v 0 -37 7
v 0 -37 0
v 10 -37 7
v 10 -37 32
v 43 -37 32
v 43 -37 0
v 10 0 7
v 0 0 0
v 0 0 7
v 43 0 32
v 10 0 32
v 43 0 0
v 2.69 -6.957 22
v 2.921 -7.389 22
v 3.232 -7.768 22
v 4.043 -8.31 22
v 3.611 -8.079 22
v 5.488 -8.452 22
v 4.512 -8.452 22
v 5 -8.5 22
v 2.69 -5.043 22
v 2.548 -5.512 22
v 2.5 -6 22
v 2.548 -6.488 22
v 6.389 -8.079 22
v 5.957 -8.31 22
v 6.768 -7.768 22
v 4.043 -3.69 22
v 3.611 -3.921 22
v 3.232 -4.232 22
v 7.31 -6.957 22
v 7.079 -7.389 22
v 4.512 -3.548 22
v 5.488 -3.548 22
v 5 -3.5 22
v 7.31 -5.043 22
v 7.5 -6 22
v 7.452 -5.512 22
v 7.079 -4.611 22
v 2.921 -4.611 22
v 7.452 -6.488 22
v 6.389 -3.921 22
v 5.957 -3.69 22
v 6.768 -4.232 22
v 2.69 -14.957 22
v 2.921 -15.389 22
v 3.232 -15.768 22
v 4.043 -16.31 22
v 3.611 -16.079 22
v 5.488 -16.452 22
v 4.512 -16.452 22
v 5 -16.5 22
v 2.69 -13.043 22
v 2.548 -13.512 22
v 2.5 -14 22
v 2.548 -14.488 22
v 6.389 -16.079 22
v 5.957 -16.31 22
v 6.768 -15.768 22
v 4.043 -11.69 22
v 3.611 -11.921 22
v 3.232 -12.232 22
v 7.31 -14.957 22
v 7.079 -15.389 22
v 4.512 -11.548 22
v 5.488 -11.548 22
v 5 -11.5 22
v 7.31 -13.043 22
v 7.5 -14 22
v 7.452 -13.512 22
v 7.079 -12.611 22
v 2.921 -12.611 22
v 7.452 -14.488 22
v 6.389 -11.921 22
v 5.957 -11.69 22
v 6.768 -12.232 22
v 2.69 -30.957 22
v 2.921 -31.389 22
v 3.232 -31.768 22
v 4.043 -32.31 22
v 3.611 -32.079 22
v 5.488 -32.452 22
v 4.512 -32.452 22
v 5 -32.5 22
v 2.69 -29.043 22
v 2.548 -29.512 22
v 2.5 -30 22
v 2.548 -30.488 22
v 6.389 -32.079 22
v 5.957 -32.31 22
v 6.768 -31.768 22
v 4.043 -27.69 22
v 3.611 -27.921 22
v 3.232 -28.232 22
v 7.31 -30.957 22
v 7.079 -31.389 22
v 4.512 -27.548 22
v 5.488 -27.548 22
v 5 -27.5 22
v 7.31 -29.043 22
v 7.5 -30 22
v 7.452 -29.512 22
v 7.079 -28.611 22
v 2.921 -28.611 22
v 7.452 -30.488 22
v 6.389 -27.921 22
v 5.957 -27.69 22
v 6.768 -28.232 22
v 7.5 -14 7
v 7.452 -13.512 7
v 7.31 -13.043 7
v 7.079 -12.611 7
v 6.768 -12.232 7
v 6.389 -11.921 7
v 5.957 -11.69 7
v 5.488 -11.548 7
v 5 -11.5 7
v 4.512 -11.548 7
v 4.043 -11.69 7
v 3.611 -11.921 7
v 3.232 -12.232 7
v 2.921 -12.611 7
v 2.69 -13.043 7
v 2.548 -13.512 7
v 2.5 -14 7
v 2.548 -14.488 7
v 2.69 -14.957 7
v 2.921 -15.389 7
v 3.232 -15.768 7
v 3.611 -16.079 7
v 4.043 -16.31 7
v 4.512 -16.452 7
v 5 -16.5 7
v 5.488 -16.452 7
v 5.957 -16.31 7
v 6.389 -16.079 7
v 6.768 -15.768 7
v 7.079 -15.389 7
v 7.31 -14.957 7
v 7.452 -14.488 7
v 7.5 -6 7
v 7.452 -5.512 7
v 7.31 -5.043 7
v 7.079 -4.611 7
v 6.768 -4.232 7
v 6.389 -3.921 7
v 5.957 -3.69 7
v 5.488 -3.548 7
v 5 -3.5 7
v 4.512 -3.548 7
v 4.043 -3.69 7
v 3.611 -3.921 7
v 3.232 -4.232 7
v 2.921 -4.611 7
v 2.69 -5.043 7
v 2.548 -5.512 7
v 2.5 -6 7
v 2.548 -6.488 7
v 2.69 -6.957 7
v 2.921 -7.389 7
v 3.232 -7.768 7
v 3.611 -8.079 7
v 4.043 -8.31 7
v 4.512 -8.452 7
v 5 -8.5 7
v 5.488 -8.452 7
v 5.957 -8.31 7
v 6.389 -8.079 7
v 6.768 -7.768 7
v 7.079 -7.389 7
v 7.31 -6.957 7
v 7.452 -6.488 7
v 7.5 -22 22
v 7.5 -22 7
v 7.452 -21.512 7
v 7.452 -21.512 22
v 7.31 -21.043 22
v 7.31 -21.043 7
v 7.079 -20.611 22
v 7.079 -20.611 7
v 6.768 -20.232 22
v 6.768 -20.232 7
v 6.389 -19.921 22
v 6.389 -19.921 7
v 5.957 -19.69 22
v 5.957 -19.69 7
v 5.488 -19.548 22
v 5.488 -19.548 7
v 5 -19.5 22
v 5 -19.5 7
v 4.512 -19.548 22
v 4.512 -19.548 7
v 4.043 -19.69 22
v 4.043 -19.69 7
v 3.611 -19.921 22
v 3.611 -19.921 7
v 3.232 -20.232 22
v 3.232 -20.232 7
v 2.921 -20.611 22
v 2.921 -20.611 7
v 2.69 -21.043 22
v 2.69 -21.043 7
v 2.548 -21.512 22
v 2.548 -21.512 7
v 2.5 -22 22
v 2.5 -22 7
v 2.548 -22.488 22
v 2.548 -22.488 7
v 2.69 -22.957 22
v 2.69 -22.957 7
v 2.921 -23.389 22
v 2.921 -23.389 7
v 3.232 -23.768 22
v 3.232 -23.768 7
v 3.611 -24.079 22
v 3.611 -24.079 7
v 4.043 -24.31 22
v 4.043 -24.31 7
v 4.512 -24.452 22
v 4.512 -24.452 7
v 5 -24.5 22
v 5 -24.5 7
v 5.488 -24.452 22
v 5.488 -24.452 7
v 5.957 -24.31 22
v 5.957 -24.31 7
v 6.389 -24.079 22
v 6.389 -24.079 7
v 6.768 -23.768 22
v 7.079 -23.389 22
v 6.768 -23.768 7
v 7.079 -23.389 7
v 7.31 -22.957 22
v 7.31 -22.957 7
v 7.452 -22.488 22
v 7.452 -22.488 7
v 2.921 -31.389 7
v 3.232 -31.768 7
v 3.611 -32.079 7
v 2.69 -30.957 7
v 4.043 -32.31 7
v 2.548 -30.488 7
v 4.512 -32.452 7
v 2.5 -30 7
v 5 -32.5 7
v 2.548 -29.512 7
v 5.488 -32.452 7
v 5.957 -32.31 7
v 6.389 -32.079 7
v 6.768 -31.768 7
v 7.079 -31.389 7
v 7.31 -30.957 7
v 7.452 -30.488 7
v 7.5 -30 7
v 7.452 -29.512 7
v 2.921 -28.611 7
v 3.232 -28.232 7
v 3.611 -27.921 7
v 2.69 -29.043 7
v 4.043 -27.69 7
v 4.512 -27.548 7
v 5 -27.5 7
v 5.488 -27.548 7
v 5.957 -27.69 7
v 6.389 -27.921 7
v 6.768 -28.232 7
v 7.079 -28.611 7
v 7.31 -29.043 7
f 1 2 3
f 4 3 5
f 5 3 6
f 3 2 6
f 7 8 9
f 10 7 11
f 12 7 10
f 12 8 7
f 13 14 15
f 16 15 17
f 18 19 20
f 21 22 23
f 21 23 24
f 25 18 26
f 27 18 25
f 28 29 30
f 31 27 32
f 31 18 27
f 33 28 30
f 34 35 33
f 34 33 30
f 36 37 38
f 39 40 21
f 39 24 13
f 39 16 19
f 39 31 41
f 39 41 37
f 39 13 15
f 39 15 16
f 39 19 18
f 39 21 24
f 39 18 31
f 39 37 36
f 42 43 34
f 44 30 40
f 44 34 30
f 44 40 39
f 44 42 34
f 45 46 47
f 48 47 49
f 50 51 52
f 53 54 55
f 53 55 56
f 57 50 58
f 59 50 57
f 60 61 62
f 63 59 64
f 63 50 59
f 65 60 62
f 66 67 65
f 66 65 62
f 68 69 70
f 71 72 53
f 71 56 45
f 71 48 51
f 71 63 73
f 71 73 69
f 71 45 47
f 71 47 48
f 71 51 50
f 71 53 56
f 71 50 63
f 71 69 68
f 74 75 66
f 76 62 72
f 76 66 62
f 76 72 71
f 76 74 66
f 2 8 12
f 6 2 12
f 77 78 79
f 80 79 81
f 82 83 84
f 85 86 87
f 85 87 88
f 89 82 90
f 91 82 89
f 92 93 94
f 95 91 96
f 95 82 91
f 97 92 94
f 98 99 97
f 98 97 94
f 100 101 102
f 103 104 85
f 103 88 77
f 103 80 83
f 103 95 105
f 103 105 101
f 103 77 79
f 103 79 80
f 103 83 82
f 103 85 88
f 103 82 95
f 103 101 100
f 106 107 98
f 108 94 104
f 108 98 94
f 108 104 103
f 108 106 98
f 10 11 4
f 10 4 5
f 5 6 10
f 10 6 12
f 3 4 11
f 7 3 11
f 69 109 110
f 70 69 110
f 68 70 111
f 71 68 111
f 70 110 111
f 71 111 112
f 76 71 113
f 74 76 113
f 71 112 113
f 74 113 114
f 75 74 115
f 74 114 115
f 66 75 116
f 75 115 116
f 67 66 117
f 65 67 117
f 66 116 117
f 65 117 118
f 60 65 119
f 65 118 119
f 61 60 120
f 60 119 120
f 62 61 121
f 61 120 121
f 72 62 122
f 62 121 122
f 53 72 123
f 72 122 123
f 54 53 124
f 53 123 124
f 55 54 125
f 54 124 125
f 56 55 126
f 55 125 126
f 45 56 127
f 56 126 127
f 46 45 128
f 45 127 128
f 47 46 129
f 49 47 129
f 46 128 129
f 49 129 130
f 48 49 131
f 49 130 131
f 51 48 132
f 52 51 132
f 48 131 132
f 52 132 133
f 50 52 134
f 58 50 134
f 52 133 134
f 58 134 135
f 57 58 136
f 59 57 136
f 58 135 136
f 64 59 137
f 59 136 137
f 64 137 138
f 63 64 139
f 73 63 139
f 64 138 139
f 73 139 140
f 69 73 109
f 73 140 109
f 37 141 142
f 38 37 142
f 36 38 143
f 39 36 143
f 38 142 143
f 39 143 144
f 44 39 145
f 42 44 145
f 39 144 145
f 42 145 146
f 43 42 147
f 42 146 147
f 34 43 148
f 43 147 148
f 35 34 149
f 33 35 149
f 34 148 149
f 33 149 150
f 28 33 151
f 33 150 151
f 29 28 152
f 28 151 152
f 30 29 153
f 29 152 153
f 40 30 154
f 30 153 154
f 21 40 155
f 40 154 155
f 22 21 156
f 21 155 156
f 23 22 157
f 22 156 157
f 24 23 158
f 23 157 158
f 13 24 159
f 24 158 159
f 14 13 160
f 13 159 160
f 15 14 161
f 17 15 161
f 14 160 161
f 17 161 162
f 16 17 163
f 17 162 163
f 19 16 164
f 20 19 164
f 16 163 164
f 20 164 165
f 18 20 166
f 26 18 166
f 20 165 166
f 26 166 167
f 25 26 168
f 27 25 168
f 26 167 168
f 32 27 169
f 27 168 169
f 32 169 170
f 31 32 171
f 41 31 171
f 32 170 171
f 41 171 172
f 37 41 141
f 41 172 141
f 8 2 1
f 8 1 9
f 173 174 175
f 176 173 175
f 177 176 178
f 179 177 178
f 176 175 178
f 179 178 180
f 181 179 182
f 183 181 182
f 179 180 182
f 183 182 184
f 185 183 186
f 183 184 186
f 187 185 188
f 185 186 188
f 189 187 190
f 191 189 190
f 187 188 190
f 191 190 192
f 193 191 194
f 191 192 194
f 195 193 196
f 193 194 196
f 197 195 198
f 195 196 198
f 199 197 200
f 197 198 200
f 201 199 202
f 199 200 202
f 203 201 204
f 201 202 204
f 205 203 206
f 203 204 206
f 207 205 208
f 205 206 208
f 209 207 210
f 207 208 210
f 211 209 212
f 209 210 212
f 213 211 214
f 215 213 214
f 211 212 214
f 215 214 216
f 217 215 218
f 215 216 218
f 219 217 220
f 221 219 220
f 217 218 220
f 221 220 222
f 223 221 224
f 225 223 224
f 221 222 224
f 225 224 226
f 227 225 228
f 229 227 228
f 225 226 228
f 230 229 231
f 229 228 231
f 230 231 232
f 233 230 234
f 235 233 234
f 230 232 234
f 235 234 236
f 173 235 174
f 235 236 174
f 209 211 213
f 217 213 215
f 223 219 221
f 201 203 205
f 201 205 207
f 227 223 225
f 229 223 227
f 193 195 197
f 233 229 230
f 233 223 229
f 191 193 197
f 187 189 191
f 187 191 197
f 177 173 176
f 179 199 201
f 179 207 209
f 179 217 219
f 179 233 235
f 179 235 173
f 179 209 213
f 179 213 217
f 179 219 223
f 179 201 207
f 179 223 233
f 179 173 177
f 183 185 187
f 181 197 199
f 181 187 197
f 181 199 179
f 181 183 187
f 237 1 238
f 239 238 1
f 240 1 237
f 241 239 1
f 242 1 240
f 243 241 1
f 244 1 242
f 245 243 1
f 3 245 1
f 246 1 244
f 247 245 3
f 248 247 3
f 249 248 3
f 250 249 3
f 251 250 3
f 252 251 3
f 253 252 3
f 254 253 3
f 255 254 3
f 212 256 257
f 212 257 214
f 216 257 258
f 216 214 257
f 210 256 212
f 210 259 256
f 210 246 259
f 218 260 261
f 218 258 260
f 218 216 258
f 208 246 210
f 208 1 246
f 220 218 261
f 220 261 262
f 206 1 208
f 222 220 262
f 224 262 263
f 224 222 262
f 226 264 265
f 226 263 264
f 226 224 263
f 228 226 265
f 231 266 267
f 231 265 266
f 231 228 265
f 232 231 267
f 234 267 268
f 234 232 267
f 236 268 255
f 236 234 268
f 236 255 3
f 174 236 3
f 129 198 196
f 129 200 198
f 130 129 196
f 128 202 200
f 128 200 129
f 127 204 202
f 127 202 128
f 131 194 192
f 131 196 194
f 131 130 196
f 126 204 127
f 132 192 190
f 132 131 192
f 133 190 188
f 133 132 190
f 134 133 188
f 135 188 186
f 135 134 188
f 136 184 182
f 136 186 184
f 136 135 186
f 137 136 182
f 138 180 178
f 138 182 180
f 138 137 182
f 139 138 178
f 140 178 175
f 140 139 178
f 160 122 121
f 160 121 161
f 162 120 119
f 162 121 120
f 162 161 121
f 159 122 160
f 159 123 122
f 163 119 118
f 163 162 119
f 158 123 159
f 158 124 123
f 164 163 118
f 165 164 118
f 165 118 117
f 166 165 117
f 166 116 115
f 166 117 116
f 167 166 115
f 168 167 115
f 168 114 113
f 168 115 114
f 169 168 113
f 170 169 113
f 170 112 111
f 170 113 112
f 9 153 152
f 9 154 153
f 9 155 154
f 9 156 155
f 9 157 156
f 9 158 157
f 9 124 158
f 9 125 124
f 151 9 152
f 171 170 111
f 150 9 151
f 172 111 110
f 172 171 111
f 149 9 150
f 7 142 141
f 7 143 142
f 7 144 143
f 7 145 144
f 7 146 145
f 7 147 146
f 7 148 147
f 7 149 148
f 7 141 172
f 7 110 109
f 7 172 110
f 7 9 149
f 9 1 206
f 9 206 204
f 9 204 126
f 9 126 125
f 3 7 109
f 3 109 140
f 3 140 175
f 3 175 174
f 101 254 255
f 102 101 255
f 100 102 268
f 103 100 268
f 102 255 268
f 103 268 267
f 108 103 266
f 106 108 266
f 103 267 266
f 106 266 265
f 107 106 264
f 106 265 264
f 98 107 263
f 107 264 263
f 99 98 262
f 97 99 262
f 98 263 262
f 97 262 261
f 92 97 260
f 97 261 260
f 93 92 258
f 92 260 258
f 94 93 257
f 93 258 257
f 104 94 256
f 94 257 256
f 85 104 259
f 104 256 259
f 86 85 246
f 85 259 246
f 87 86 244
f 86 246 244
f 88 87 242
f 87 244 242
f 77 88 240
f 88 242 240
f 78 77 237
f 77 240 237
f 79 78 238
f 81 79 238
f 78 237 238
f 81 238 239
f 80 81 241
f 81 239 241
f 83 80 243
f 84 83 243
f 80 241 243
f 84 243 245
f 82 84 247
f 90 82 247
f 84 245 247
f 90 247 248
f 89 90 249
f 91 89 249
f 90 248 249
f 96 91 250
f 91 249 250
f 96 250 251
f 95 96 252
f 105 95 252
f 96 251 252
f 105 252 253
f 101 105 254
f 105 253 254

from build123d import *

# Parameters (mm, degrees)
SKETCH1_W           = 43
SKETCH1_H           = 37
BOSS_EXTRUDE1_DEPTH = 32
SKETCH2_W           = 10
SKETCH2_H           = 37
CUT_EXTRUDE1_DEPTH  = 25
SKETCH3_R           = 2.5
BOSS_EXTRUDE2_DEPTH = 15


with BuildPart() as part:
    # Sketch1 → Boss-Extrude1 (new body)
    with BuildSketch(Plane.XY):
        with Locations((21.5, -18.5)):
            Rectangle(SKETCH1_W, SKETCH1_H)
    extrude(amount=BOSS_EXTRUDE1_DEPTH)

    # Sketch2 → Cut-Extrude1 (cut)
    with BuildSketch(Plane.XY.offset(32)):
        with Locations((5, -18.5)):
            Rectangle(SKETCH2_W, SKETCH2_H)
    extrude(amount=-CUT_EXTRUDE1_DEPTH, mode=Mode.SUBTRACT)

    # Sketch3 → Boss-Extrude2 (add)
    with BuildSketch(Plane.XY.offset(7)):
        with Locations((5, -6)):
            Circle(SKETCH3_R)
        with Locations((5, -14)):
            Circle(SKETCH3_R)
        with Locations((5, -22)):
            Circle(SKETCH3_R)
        with Locations((5, -30)):
            Circle(SKETCH3_R)
    extrude(amount=BOSS_EXTRUDE2_DEPTH)


solid = part.part
